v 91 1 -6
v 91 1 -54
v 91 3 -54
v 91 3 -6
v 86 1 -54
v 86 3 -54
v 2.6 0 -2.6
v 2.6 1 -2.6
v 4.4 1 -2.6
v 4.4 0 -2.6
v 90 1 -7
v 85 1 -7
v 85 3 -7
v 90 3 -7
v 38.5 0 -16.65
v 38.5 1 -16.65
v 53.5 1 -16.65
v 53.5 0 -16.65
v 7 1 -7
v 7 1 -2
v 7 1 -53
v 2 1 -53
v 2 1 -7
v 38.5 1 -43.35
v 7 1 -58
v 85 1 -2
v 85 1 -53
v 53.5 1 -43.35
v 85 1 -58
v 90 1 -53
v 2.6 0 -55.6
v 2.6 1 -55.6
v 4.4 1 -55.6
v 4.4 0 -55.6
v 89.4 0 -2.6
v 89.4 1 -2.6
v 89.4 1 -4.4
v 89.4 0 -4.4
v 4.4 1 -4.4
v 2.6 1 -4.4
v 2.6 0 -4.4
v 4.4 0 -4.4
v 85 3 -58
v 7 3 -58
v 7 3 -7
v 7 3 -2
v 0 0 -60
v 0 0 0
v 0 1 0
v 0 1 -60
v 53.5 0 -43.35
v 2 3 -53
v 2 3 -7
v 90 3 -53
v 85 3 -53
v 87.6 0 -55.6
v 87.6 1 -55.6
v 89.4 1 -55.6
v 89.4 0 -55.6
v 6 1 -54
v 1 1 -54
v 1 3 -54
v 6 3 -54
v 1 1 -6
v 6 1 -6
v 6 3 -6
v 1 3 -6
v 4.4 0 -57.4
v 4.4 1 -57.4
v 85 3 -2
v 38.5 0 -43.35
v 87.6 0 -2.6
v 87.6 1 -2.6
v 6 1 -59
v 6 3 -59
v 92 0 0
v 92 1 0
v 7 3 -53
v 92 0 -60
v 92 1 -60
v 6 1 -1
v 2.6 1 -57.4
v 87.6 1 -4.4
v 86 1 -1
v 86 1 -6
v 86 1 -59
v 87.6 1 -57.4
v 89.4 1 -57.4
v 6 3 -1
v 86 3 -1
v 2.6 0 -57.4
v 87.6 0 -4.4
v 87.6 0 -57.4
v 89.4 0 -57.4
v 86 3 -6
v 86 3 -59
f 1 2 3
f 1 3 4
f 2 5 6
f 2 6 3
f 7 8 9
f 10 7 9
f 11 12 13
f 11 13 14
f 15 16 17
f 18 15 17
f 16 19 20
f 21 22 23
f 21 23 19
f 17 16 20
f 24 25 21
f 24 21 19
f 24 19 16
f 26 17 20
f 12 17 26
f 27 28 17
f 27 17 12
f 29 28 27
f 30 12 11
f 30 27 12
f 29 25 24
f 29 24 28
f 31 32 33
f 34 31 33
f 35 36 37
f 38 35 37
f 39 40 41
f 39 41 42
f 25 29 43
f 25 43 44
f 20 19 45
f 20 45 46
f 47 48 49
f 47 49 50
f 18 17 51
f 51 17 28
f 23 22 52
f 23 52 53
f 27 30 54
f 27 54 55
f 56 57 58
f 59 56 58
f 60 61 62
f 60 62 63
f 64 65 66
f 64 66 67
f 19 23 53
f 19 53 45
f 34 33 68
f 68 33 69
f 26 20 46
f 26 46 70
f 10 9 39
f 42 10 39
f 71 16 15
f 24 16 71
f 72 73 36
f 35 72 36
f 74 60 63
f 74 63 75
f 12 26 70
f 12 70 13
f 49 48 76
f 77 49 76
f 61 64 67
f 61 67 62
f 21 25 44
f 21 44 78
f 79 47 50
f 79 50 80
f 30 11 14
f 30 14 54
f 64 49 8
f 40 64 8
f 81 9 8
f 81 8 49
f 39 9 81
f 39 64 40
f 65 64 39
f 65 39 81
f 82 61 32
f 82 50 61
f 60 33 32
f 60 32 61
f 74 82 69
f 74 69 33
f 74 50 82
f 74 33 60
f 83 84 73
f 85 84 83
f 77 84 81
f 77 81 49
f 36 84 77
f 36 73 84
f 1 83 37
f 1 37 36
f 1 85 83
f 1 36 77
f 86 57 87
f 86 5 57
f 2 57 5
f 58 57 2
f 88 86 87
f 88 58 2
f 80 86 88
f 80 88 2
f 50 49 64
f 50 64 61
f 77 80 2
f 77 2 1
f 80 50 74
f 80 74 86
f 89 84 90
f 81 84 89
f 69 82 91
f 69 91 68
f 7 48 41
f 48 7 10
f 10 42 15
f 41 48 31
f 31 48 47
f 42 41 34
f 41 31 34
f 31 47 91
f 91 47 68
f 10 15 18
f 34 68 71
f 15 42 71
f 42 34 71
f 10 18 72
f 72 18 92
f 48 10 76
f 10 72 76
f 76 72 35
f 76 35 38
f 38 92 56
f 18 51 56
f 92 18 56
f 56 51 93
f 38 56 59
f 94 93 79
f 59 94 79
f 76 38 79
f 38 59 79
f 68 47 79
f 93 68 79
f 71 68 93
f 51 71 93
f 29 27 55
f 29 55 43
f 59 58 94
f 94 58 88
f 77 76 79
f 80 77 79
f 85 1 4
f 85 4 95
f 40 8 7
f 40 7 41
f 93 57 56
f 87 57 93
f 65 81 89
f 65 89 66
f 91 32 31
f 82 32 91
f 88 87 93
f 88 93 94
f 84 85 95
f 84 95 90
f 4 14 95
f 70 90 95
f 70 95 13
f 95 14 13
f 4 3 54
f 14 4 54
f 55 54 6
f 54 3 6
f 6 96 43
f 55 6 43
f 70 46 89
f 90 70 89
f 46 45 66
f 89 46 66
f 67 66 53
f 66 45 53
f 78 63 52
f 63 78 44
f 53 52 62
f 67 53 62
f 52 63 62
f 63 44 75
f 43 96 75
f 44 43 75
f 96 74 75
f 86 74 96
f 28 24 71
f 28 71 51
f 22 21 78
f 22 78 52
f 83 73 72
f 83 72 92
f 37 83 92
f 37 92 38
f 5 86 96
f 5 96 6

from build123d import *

# Parameters (mm, degrees)
SKETCH_1_W          = 92
SKETCH_1_H          = 60
EXTRUDE_1_DEPTH     = 1
EXTRUDE_3_DEPTH     = 2
SKETCH_6_W          = 1.8
SKETCH_6_H          = 1.8
CUT_EXTRUDE_3_DEPTH = 1
SKETCH_7_W          = 1.8
SKETCH_7_H          = 1.8
CUT_EXTRUDE_4_DEPTH = 1
SKETCH_8_W          = 1.8
SKETCH_8_H          = 1.8
CUT_EXTRUDE_5_DEPTH = 1
SKETCH_9_W          = 1.8
SKETCH_9_H          = 1.8
CUT_EXTRUDE_6_DEPTH = 1
SKETCH_15_W         = 15
SKETCH_15_H         = 26.7
CUT_EXTRUDE_8_DEPTH = 1


with BuildPart() as part:
    # Эскиз1 → Бобышка-Вытянуть1 (new body)
    with BuildSketch(Plane(origin=(0, 0, 0), x_dir=(1, 0, 0), z_dir=(0, 1, 0))):
        with Locations((46, 30)):
            Rectangle(SKETCH_1_W, SKETCH_1_H)
    extrude(amount=EXTRUDE_1_DEPTH)

    # Эскиз3 → Бобышка-Вытянуть3 (add)
    with BuildSketch(Plane(origin=(0, 1, 0), x_dir=(1, 0, 0), z_dir=(0, 1, 0))):
        Polygon((86, 54), (91, 54), (91, 6), (86, 6), (86, 1), (6, 1), (6, 6), (1, 6), (1, 54), (6, 54), (6, 59), (86, 59), align=None)
        Polygon((7, 58), (7, 53), (2, 53), (2, 7), (7, 7), (7, 2), (85, 2), (85, 7), (90, 7), (90, 53), (85, 53), (85, 58), align=None, mode=Mode.SUBTRACT)
    extrude(amount=EXTRUDE_3_DEPTH)

    # Эскиз6 → Вырез-Вытянуть3 (cut)
    with BuildSketch(Plane(origin=(0, 1, 0), x_dir=(1, 0, 0), z_dir=(0, 1, 0))):
        with Locations((3.5, 56.5)):
            Rectangle(SKETCH_6_W, SKETCH_6_H)
    extrude(amount=-CUT_EXTRUDE_3_DEPTH, mode=Mode.SUBTRACT)

    # Эскиз7 → Вырез-Вытянуть4 (cut)
    with BuildSketch(Plane(origin=(0, 1, 0), x_dir=(1, 0, 0), z_dir=(0, 1, 0))):
        with Locations((88.5, 56.5)):
            Rectangle(SKETCH_7_W, SKETCH_7_H)
    extrude(amount=-CUT_EXTRUDE_4_DEPTH, mode=Mode.SUBTRACT)

    # Эскиз8 → Вырез-Вытянуть5 (cut)
    with BuildSketch(Plane(origin=(0, 1, 0), x_dir=(1, 0, 0), z_dir=(0, 1, 0))):
        with Locations((88.5, 3.5)):
            Rectangle(SKETCH_8_W, SKETCH_8_H)
    extrude(amount=-CUT_EXTRUDE_5_DEPTH, mode=Mode.SUBTRACT)

    # Эскиз9 → Вырез-Вытянуть6 (cut)
    with BuildSketch(Plane(origin=(0, 1, 0), x_dir=(1, 0, 0), z_dir=(0, 1, 0))):
        with Locations((3.5, 3.5)):
            Rectangle(SKETCH_9_W, SKETCH_9_H)
    extrude(amount=-CUT_EXTRUDE_6_DEPTH, mode=Mode.SUBTRACT)

    # Эскиз15 → Вырез-Вытянуть8 (cut)
    with BuildSketch(Plane(origin=(0, 1, 0), x_dir=(1, 0, 0), z_dir=(0, 1, 0))):
        with Locations((46, 30)):
            Rectangle(SKETCH_15_W, SKETCH_15_H)
    extrude(amount=-CUT_EXTRUDE_8_DEPTH, mode=Mode.SUBTRACT)


solid = part.part
